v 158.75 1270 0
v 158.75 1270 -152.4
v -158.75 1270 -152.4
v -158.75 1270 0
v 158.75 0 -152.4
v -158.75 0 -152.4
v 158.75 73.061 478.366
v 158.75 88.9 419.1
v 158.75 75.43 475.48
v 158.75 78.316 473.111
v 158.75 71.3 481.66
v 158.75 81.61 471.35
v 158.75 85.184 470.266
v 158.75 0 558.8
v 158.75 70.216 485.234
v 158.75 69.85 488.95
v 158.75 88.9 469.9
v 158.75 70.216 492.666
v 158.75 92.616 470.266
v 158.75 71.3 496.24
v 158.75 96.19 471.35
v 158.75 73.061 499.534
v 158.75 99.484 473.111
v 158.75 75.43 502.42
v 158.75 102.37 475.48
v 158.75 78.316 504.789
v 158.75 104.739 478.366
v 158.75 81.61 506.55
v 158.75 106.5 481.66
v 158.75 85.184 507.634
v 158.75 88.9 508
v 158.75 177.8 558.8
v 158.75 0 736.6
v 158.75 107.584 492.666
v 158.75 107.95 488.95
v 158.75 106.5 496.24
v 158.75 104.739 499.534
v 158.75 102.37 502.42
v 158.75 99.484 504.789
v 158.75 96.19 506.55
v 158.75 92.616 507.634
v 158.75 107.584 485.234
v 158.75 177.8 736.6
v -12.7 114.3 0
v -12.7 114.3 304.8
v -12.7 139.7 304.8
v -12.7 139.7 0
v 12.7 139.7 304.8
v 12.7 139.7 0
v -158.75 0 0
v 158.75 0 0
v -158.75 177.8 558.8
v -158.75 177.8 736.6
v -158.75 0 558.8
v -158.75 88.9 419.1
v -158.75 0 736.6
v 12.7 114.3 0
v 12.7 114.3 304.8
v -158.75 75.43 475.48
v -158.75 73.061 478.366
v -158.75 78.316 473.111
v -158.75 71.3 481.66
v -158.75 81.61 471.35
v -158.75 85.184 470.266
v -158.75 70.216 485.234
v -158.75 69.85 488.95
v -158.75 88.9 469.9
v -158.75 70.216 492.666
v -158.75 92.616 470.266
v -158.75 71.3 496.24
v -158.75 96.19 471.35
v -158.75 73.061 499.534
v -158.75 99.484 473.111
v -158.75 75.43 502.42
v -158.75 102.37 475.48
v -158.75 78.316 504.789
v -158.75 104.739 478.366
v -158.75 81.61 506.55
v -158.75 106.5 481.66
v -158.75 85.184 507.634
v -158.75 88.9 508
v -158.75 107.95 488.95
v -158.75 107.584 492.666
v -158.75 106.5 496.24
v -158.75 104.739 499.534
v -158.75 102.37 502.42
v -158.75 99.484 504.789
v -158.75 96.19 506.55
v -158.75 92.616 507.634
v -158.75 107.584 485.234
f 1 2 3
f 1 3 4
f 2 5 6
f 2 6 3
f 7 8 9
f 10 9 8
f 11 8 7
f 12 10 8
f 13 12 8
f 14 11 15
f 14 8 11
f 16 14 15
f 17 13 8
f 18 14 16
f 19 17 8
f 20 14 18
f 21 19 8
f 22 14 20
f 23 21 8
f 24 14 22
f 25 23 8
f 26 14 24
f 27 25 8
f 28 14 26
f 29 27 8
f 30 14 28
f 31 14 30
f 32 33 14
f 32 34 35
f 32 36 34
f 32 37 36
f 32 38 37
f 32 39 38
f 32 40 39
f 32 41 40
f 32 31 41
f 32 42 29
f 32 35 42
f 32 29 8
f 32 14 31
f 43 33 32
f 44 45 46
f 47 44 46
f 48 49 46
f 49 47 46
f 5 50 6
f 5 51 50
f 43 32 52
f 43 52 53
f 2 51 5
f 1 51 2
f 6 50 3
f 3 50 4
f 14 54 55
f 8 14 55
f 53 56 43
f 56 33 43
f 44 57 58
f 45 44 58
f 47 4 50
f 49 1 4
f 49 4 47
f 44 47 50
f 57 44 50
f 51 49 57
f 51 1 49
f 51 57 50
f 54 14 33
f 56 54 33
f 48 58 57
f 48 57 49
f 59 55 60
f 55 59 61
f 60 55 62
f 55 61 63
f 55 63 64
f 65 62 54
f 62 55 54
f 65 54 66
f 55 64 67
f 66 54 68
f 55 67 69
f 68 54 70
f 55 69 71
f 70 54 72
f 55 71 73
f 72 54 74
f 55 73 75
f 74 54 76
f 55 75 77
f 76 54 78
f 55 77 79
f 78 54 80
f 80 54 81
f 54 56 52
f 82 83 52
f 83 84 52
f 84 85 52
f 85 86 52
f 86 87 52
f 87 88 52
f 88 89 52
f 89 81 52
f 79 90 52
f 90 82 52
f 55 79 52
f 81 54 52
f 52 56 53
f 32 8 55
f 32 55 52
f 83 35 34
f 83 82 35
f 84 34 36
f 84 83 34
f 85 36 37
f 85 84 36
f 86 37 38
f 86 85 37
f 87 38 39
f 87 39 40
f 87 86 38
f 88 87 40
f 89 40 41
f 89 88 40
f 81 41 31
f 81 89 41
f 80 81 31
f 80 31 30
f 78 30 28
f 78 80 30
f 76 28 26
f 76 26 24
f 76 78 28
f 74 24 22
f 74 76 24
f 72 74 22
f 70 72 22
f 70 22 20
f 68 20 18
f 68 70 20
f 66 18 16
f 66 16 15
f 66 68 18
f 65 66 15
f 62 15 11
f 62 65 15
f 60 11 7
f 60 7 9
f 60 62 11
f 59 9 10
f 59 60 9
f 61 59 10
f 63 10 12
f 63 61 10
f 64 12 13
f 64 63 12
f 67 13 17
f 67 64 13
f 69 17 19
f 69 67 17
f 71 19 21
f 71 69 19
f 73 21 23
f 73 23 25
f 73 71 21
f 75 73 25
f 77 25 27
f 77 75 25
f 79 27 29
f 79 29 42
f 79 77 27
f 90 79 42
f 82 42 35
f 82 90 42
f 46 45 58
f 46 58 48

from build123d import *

# Parameters (mm, degrees)
F0_W          = 177.8
F0_H          = 177.8
F0_R          = 19.05
F1_DEPTH      = 158.75
F1_DEPTH_BACK = 158.75
F0_W_2        = 25.4
F0_H_2        = 304.8
F2_DEPTH      = 12.7
F2_DEPTH_BACK = 12.7


with BuildPart() as f1:
    # F0 (on Right) → F1 (new body, two sides)
    with BuildSketch(Plane.YZ) as f1_sk:
        with Locations((88.9, 647.7)):
            Rectangle(F0_W, F0_H)
        Polygon((177.8, 558.8), (0, 558.8), (88.9, 419.1), align=None)
        with Locations((88.9, 488.95)):
            Circle(F0_R, mode=Mode.SUBTRACT)
        Polygon((114.3, 0), (0, 0), (0, -152.4), (1270, -152.4), (1270, 0), (139.7, 0), align=None)
    extrude(amount=F1_DEPTH)
    extrude(f1_sk.sketch, amount=-F1_DEPTH_BACK)

    # F0 (on Right) → F2 (join, two sides)
    with BuildSketch(Plane.YZ) as f2_sk:
        with Locations((127, 152.4)):
            Rectangle(F0_W_2, F0_H_2)
    extrude(amount=F2_DEPTH)
    extrude(f2_sk.sketch, amount=-F2_DEPTH_BACK)


solid = f1.part
